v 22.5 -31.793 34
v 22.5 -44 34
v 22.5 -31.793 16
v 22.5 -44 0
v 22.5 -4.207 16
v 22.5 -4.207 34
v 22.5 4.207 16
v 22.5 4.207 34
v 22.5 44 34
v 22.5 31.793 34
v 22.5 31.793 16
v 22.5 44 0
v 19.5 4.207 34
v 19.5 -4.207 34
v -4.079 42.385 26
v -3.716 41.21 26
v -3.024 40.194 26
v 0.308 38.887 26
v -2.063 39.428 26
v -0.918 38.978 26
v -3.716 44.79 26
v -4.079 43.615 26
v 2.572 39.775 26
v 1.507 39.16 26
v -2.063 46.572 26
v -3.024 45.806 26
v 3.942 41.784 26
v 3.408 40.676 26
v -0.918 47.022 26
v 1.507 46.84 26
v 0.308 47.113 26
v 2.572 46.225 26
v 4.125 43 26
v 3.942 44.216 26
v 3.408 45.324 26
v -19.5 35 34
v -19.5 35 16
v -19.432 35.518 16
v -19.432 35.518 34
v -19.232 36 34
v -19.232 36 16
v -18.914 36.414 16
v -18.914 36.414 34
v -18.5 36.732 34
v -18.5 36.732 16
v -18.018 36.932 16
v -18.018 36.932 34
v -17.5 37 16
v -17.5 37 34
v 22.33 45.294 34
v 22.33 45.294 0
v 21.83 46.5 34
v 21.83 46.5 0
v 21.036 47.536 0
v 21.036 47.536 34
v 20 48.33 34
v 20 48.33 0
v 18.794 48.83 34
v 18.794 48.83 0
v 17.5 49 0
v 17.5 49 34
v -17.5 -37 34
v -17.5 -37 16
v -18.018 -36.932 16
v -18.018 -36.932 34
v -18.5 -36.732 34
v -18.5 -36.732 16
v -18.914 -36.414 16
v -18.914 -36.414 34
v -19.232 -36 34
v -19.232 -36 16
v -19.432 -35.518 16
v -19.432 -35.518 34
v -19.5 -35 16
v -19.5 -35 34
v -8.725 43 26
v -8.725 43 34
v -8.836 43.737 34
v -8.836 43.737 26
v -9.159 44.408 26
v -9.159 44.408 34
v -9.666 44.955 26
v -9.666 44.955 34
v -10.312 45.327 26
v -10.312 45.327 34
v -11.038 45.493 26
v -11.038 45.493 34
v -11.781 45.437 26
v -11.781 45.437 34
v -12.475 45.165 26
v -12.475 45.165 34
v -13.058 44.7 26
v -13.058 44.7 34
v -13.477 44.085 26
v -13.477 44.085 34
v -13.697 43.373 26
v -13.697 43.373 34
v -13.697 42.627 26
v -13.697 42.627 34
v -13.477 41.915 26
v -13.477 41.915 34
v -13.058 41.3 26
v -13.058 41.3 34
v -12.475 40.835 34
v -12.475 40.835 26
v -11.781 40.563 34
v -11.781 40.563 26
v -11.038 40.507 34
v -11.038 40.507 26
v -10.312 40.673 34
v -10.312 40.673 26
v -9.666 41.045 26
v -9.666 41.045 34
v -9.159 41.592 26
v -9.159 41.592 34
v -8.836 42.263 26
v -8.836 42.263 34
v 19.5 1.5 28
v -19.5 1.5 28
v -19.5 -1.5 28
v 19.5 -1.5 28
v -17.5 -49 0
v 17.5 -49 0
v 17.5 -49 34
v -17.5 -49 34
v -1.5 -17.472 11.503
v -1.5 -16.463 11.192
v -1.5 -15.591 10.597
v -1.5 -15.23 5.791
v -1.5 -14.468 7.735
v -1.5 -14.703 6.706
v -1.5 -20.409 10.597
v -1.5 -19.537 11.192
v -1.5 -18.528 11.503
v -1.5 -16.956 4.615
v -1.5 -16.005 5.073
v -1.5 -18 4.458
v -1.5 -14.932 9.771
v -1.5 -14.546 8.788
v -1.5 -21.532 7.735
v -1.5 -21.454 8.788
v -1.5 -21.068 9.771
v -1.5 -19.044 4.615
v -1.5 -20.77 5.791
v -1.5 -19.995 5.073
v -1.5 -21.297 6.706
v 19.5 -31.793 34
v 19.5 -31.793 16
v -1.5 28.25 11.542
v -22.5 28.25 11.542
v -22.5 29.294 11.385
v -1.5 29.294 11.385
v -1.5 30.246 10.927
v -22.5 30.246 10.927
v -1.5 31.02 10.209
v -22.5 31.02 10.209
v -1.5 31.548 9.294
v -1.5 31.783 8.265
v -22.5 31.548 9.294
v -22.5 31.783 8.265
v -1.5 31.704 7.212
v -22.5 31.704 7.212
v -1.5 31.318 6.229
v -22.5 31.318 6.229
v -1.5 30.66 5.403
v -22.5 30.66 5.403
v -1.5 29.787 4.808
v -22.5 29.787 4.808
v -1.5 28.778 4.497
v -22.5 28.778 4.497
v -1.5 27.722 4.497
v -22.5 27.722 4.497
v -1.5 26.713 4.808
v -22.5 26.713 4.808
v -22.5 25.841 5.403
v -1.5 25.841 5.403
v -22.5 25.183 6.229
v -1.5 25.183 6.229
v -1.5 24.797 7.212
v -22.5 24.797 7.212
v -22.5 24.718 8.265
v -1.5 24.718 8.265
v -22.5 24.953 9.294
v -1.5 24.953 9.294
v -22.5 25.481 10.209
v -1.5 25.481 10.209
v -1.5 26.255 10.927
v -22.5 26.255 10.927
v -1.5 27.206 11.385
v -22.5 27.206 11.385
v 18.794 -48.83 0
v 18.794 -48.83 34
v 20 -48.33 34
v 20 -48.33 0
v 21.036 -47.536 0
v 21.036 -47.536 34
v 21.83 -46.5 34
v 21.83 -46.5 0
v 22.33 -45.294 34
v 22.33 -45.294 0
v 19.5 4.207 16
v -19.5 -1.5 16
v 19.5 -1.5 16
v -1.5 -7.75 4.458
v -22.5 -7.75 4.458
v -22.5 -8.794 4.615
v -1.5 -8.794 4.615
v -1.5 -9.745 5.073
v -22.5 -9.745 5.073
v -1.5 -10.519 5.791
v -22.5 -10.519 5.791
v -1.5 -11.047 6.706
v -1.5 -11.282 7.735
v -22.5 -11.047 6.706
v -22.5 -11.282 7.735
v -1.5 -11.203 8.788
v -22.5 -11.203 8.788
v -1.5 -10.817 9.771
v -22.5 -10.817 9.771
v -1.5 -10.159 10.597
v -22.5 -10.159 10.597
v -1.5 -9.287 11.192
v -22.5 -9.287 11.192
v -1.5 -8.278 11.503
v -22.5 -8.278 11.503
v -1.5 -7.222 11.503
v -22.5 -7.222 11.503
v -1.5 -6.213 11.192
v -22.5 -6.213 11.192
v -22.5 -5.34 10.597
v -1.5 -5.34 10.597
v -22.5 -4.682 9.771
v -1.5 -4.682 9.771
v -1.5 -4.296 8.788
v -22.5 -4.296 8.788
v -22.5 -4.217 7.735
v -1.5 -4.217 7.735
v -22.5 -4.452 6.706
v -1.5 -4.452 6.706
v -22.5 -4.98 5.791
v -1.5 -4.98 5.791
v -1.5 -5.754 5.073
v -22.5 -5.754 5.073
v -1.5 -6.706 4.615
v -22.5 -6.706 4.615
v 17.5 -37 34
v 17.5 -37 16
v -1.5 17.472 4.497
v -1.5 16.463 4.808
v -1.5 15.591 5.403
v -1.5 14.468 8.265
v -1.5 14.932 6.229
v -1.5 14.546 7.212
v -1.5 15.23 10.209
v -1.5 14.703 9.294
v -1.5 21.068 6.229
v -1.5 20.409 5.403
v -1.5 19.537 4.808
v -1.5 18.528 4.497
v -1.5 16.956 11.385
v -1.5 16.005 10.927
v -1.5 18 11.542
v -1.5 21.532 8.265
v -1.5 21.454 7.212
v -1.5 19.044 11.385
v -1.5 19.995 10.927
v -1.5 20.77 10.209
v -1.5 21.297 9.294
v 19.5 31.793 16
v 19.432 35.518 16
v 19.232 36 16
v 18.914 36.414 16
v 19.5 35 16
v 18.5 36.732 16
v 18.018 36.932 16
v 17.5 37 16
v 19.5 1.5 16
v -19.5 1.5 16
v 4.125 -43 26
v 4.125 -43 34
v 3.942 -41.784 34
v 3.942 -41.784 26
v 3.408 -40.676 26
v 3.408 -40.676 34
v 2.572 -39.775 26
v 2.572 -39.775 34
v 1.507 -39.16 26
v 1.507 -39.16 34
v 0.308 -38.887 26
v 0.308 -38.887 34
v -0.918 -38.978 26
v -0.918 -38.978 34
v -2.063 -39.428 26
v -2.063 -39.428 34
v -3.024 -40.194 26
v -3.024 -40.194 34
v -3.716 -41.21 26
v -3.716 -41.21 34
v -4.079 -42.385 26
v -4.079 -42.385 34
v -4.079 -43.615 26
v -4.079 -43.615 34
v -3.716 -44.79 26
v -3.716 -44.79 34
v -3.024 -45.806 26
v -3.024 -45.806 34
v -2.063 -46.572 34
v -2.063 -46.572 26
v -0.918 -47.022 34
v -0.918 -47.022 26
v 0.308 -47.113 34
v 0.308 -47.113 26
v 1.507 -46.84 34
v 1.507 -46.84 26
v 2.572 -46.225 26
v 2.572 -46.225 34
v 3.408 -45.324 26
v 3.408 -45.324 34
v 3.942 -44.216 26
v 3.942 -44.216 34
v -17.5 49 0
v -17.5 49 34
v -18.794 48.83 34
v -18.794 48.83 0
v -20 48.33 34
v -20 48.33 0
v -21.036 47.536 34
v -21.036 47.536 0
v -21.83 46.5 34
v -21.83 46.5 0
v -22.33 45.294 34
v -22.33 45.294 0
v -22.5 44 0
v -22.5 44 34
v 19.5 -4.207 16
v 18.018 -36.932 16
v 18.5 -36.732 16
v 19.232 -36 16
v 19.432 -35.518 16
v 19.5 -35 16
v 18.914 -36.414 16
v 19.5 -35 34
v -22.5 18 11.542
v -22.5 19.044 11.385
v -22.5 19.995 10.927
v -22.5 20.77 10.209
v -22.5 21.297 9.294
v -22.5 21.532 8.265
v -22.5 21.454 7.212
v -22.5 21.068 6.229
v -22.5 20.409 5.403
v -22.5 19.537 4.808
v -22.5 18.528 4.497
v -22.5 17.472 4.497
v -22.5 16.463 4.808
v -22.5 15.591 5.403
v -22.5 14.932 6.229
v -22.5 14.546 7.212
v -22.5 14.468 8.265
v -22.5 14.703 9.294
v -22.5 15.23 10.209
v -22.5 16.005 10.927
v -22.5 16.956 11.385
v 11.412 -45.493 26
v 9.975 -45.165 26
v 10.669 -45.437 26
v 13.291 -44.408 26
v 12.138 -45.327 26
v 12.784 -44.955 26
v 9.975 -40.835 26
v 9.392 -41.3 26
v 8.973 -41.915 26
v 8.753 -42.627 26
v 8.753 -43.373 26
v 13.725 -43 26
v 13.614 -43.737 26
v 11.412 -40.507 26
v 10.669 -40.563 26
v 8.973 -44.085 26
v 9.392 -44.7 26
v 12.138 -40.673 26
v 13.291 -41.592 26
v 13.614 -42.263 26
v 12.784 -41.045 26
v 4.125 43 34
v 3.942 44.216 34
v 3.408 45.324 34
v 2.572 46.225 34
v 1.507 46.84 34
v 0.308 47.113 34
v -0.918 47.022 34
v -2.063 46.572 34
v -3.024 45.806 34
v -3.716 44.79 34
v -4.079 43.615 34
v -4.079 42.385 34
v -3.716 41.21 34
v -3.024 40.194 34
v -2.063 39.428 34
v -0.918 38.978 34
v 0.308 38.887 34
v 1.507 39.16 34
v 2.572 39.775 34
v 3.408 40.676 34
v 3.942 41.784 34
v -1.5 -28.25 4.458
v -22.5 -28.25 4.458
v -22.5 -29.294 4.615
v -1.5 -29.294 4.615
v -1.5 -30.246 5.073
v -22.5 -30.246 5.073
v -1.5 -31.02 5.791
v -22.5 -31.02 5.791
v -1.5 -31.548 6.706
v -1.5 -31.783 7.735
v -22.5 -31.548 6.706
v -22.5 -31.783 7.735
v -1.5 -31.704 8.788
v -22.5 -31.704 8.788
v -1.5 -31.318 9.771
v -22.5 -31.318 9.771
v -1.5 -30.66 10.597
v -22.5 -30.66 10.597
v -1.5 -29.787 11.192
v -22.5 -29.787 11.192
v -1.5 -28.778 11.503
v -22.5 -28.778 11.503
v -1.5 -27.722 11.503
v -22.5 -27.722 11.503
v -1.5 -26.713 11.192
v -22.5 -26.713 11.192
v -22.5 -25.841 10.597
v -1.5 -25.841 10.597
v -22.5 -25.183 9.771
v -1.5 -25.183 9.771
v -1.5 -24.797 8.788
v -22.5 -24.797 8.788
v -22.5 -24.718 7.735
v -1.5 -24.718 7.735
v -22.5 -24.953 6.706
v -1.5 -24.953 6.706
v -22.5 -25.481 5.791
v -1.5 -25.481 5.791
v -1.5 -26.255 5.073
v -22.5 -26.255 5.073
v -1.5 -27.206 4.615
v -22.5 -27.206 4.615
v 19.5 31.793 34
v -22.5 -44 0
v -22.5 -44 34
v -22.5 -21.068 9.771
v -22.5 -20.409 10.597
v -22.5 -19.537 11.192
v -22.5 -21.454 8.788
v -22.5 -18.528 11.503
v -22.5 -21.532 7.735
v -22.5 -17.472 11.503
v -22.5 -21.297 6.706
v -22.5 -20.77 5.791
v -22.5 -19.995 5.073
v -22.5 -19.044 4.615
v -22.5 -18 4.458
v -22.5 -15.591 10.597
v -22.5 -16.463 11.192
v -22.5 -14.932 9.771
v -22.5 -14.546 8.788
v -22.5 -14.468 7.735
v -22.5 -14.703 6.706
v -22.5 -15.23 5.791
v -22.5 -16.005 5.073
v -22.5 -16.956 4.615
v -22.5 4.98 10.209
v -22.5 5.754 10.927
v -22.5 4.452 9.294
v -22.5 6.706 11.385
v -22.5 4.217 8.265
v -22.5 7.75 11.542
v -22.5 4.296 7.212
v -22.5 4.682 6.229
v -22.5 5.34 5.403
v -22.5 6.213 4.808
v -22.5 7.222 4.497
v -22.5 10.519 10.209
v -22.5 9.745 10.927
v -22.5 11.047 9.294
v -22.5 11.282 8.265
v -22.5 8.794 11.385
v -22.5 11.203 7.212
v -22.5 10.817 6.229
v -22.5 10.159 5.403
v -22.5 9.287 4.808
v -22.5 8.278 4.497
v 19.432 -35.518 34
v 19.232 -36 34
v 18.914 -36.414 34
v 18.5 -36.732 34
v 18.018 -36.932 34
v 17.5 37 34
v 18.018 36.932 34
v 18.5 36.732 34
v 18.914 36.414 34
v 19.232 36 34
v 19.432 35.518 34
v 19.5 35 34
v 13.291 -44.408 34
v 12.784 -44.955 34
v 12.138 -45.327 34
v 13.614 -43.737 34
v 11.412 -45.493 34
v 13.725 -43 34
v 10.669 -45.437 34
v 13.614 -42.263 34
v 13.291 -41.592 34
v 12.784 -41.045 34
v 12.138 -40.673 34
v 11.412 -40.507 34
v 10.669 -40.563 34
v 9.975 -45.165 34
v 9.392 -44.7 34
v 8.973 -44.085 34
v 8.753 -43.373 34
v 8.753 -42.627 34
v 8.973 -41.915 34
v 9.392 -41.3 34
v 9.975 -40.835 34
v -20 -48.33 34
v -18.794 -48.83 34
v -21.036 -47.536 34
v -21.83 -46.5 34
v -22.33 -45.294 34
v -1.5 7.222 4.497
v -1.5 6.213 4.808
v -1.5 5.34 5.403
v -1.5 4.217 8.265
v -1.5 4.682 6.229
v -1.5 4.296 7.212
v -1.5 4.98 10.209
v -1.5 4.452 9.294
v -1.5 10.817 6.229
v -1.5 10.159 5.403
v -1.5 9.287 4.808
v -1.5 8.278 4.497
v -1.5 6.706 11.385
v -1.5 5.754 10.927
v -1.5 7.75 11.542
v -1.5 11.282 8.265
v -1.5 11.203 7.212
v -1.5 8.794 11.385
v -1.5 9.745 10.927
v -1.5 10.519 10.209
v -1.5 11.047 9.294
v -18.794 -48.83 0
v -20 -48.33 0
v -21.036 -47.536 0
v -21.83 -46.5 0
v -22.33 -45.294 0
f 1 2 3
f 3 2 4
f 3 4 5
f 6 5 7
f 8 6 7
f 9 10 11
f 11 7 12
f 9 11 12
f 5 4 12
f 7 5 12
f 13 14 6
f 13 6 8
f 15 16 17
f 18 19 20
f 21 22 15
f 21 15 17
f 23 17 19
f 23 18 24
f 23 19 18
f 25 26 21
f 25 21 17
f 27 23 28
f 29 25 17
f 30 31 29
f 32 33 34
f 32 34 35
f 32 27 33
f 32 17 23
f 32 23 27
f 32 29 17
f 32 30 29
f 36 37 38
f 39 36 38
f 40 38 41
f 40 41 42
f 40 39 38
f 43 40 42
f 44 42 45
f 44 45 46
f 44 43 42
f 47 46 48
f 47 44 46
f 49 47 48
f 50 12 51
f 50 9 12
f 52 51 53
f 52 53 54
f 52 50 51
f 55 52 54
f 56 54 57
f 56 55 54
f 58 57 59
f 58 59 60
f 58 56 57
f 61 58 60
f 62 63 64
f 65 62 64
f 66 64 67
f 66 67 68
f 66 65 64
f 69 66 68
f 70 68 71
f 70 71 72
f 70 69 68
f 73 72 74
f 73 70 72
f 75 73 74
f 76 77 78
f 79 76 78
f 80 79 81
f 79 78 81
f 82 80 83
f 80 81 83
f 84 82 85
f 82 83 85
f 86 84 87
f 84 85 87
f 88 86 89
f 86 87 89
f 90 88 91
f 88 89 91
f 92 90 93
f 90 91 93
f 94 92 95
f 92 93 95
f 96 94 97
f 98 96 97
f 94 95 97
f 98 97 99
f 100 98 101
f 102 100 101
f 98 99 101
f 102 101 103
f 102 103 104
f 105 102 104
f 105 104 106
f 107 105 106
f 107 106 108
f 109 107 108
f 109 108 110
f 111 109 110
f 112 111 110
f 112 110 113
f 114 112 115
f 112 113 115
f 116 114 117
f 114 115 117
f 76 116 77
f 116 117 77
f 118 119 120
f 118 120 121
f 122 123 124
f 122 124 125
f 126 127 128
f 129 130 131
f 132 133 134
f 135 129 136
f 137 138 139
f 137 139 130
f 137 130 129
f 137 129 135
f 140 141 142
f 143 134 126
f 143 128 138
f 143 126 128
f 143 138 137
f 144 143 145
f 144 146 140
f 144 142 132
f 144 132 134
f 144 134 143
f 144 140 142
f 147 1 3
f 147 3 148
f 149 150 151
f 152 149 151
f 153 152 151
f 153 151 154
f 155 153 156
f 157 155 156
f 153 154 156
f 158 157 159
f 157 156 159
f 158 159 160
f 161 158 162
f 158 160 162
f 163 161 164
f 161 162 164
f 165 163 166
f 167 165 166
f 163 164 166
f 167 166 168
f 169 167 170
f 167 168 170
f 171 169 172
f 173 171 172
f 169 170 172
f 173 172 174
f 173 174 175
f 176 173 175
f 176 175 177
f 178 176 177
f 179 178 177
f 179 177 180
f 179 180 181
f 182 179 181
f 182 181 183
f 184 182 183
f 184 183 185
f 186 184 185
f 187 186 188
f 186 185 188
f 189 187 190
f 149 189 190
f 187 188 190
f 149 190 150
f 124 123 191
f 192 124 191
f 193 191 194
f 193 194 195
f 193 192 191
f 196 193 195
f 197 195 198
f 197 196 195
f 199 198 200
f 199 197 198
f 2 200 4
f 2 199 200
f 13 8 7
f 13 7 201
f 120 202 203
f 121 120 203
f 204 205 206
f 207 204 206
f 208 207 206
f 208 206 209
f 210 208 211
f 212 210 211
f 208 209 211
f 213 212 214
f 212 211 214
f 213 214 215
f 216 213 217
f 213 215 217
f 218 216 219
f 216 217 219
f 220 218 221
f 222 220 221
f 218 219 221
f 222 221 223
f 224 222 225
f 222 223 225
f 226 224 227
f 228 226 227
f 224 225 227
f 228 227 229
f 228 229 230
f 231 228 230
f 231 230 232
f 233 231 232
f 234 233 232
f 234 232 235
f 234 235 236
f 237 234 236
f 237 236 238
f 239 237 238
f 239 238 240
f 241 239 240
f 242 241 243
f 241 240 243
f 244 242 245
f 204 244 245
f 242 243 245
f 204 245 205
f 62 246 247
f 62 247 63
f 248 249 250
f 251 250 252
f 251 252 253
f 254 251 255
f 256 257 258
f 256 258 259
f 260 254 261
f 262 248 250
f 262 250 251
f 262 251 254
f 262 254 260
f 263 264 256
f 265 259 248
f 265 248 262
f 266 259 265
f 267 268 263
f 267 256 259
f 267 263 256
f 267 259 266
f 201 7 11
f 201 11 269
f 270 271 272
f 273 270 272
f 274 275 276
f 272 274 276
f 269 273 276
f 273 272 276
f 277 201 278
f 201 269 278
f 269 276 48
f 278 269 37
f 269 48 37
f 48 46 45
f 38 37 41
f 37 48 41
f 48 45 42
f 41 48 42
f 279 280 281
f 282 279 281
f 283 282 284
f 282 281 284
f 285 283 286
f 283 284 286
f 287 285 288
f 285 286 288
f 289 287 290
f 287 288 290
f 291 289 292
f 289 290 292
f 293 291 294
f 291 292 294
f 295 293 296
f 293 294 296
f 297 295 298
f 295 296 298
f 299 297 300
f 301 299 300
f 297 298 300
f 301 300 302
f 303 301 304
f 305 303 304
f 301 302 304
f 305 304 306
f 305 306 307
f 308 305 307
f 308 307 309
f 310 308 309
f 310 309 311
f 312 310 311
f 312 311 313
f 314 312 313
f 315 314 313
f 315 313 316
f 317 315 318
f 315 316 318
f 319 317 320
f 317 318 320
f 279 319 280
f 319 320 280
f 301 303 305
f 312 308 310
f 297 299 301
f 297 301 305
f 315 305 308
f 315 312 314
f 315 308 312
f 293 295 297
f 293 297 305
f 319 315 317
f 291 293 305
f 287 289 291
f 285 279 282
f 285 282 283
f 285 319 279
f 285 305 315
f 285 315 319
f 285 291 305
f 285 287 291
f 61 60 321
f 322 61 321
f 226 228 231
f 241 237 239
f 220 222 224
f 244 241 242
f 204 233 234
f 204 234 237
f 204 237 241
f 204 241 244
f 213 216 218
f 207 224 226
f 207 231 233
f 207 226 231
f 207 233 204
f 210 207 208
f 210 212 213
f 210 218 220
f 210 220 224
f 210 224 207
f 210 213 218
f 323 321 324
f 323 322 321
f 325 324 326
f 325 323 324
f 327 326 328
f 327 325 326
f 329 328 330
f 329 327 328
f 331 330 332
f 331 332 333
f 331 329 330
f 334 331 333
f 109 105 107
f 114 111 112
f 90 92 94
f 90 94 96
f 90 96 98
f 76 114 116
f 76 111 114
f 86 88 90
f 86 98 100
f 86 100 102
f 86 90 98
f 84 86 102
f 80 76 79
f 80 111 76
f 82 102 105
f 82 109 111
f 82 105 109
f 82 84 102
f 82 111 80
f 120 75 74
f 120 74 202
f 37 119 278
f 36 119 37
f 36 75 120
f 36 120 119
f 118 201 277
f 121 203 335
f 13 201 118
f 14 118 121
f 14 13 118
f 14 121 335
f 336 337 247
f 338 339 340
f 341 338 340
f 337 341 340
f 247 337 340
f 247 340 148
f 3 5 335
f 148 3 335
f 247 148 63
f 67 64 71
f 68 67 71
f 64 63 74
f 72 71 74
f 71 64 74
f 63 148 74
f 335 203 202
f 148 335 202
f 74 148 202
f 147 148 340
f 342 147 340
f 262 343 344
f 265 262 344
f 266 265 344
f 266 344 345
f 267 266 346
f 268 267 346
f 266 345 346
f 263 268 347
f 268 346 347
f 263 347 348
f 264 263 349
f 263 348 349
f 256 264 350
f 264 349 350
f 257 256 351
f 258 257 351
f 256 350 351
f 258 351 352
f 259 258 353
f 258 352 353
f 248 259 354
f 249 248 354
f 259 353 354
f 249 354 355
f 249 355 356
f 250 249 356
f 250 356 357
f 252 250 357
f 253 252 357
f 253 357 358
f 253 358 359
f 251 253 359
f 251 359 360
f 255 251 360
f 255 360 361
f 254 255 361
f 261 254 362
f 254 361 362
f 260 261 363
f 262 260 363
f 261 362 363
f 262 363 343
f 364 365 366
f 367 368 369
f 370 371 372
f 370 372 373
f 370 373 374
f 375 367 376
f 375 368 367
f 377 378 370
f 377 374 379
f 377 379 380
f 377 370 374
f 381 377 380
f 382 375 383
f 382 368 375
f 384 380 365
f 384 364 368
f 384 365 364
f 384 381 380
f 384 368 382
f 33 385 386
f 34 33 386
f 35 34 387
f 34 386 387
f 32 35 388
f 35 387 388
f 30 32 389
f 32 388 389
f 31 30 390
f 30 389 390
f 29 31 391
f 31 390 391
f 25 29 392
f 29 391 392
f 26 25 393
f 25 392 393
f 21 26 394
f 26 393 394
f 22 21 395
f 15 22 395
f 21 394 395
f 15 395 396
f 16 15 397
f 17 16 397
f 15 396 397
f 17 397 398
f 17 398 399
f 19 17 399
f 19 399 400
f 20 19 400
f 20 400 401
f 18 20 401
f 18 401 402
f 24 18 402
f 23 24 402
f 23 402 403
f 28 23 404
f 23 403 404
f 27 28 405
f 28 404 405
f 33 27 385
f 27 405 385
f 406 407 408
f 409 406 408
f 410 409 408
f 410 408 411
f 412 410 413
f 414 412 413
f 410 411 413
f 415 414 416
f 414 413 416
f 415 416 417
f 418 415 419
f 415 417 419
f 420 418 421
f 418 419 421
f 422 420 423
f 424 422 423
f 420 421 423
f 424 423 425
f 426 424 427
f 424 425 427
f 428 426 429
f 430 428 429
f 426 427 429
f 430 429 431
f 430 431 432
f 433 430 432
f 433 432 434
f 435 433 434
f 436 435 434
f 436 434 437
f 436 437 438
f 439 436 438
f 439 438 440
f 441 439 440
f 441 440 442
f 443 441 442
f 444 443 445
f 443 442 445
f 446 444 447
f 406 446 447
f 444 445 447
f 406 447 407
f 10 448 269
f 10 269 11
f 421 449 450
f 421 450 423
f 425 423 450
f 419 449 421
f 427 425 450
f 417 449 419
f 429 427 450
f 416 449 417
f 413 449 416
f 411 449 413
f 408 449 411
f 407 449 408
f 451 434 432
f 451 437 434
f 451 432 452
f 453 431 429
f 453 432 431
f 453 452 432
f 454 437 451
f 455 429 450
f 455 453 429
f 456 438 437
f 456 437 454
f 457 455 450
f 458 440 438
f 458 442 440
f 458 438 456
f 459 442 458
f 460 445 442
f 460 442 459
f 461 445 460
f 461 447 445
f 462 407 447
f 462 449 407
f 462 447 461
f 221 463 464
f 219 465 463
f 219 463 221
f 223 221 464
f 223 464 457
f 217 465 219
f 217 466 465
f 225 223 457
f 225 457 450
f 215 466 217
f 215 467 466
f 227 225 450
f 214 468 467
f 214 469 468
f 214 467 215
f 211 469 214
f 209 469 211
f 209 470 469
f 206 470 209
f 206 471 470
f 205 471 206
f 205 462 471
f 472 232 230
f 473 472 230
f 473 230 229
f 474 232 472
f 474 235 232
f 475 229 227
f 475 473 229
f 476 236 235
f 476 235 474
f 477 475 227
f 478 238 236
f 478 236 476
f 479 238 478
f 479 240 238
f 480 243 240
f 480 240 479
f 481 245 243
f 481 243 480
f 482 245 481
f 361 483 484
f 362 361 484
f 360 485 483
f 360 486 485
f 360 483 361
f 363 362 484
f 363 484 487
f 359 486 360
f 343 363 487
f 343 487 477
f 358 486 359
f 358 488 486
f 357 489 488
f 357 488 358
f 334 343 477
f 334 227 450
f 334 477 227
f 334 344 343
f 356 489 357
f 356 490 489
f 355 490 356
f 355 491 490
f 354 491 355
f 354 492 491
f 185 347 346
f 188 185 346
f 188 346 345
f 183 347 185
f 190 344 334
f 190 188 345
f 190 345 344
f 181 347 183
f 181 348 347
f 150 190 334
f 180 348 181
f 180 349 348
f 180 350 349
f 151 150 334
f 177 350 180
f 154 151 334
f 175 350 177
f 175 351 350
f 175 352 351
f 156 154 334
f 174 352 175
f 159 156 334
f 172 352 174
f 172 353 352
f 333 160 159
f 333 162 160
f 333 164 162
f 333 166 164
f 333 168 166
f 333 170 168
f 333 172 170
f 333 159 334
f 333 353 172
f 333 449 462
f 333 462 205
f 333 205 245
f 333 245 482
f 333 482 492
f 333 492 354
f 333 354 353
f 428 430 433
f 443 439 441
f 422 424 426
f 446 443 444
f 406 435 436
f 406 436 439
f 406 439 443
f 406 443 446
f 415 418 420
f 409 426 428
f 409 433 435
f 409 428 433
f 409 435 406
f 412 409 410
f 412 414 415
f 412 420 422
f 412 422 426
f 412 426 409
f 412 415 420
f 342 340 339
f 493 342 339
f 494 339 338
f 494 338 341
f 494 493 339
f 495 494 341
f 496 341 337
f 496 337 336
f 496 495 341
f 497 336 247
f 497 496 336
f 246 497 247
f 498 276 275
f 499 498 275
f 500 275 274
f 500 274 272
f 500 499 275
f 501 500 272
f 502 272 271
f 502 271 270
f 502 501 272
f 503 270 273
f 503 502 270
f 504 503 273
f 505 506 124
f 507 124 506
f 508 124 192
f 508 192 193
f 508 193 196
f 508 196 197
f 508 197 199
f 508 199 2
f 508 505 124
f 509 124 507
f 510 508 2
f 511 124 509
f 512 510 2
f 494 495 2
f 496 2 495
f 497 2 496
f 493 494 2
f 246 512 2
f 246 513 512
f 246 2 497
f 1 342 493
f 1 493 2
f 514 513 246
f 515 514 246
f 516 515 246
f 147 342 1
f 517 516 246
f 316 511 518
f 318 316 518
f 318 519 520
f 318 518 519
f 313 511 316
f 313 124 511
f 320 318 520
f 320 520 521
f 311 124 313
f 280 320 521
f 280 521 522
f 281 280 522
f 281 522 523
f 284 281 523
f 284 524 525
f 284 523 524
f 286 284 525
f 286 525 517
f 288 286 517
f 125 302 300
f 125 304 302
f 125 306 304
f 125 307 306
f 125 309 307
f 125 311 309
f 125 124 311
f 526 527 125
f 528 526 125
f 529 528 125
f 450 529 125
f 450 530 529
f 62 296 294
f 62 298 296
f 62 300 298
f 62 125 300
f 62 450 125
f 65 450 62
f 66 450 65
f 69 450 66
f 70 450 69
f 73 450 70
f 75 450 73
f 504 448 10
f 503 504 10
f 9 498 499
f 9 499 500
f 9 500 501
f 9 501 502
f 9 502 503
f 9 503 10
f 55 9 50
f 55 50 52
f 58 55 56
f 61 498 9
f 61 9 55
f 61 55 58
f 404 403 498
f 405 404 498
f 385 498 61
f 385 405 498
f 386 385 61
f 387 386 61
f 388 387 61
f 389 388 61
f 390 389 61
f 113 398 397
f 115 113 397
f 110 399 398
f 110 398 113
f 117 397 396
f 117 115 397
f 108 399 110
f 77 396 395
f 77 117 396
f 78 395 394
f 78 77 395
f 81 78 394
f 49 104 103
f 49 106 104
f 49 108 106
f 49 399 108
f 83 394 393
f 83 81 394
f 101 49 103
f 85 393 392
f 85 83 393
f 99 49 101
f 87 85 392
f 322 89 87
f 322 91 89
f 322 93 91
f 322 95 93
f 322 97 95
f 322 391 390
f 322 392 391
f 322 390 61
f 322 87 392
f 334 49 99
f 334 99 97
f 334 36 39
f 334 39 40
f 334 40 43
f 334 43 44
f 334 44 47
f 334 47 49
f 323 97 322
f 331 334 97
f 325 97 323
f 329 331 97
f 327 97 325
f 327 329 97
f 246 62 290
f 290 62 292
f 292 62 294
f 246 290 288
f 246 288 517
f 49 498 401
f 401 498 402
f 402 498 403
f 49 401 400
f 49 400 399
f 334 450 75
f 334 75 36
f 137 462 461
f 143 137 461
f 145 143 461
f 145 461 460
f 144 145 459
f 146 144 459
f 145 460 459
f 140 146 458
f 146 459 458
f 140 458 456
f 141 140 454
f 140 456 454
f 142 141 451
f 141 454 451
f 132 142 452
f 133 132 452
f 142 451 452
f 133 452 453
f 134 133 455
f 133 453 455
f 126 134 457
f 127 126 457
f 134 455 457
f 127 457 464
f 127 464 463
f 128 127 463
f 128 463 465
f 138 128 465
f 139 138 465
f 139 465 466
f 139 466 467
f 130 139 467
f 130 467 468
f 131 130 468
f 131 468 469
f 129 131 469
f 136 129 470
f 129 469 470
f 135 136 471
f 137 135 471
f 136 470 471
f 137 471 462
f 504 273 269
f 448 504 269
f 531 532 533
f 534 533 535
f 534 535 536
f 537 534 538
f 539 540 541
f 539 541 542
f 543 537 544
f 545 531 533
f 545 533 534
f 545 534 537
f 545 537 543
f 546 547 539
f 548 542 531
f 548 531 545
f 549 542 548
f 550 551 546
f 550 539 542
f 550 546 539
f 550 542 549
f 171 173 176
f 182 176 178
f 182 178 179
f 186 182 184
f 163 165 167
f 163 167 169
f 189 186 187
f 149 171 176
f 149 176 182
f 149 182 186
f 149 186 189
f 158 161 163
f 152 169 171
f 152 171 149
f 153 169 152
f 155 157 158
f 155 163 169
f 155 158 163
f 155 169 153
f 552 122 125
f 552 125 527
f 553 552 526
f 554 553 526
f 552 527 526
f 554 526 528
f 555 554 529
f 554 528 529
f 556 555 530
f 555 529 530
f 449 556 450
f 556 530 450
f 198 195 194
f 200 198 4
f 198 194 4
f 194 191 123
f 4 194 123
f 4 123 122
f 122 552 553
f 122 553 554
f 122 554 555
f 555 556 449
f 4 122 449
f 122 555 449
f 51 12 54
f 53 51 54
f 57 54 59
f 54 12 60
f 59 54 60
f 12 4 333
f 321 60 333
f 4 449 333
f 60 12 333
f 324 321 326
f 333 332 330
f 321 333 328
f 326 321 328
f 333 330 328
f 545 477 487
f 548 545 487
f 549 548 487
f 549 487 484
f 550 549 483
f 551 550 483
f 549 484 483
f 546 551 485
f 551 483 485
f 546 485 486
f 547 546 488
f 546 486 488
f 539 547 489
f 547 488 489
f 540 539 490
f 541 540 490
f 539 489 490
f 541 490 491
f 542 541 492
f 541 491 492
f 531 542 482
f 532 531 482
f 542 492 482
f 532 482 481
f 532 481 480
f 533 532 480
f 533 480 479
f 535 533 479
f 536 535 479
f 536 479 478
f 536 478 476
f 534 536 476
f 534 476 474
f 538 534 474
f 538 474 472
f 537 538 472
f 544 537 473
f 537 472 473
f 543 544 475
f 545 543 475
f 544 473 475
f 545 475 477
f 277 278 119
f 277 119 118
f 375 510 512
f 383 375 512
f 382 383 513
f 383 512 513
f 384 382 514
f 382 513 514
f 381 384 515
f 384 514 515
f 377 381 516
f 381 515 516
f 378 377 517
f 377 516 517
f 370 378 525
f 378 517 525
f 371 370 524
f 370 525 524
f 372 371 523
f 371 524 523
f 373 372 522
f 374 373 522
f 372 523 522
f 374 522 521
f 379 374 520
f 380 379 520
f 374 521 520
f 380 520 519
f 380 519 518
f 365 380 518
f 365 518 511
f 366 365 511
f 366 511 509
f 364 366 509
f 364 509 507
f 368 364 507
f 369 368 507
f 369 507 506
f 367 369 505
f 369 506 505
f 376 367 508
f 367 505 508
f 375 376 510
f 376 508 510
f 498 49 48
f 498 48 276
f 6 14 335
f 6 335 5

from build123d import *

# Parameters (mm, degrees)
CROQUIS1_W              = 98
CROQUIS1_H              = 45
SALIENTE_EXTRUIR1_DEPTH = 34
REDONDEO1_R             = 5
CROQUIS2_R              = 4.125
CROQUIS2_R_2            = 2.5
CORTAR_EXTRUIR1_DEPTH   = 8
CORTAR_EXTRUIR2_DEPTH   = 18
CROQUIS4_W              = 39
CROQUIS4_H              = 3
SALIENTE_EXTRUIR2_DEPTH = 12
CROQUIS5_R              = 3.54232781
CORTAR_EXTRUIR3_DEPTH   = 21


with BuildPart() as part:
    # Croquis1 → Saliente-Extruir1 (new body)
    with BuildSketch(Plane(origin=(0, 0, 0), x_dir=(0, 1, 0), z_dir=(0, 0, 1))):
        Rectangle(CROQUIS1_W, CROQUIS1_H)
    extrude(amount=SALIENTE_EXTRUIR1_DEPTH)

    # Redondeo1
    redondeo1_edges = [part.edges().sort_by_distance(p)[0] for p in [
        (22.5, 49, 17),
        (22.5, -49, 17),
        (-22.5, -49, 17),
        (-22.5, 49, 17),
    ]]
    fillet(redondeo1_edges, radius=REDONDEO1_R)

    # Croquis2 → Cortar-Extruir1 (cut)
    with BuildSketch(Plane.XY.offset(34)):
        with Locations((0, 43)):
            Circle(CROQUIS2_R)
        with Locations((0, -43)):
            Circle(CROQUIS2_R)
        with Locations((-11.225, 43)):
            Circle(CROQUIS2_R_2)
        with Locations((11.225, -43)):
            Circle(CROQUIS2_R_2)
    extrude(amount=-CORTAR_EXTRUIR1_DEPTH, mode=Mode.SUBTRACT)

    # Croquis3 → Cortar-Extruir2 (cut)
    with BuildSketch(Plane.XY.offset(34)):
        with BuildLine():
            Line((-19.5, -35), (-19.5, 35))
            ThreePointArc((-19.5, 35), (-18.914213562, 36.414213562), (-17.5, 37))
            Line((-17.5, 37), (17.5, 37))
            ThreePointArc((17.5, 37), (18.914213562, 36.414213562), (19.5, 35))
            Line((19.5, 35), (19.5, 31.792704716))
            Line((19.5, 31.792704716), (22.5, 31.792704716))
            Line((22.5, 31.792704716), (22.5, 4.207295284))
            Line((22.5, 4.207295284), (19.5, 4.207295284))
            Line((19.5, 4.207295284), (19.5, -4.207295284))
            Line((19.5, -4.207295284), (22.5, -4.207295284))
            Line((22.5, -4.207295284), (22.5, -31.792704716))
            Line((22.5, -31.792704716), (19.5, -31.792704716))
            Line((19.5, -31.792704716), (19.5, -35))
            ThreePointArc((19.5, -35), (18.914213562, -36.414213562), (17.5, -37))
            Line((17.5, -37), (-17.5, -37))
            ThreePointArc((-17.5, -37), (-18.914213562, -36.414213562), (-19.5, -35))
        make_face()
    extrude(amount=-CORTAR_EXTRUIR2_DEPTH, mode=Mode.SUBTRACT)

    # Croquis4 → Saliente-Extruir2 (add)
    with BuildSketch(Plane.XY.offset(16)):
        Rectangle(CROQUIS4_W, CROQUIS4_H)
    extrude(amount=SALIENTE_EXTRUIR2_DEPTH)

    # Croquis5 → Cortar-Extruir3 (cut)
    with BuildSketch(Plane(origin=(-22.5, 0, 0), x_dir=(0, -1, 0), z_dir=(-1, 0, 0))):
        with Locations(Location((-7.749623094, 8, 0), (0, 0, 90))):
            Circle(CROQUIS5_R)
        with Locations(Location((-18, 8, 0), (0, 0, 90))):
            Circle(CROQUIS5_R)
        with Locations(Location((-28.250376906, 8, 0), (0, 0, 90))):
            Circle(CROQUIS5_R)
        with Locations(Location((28.250376906, 8, 0), (0, 0, 270))):
            Circle(CROQUIS5_R)
        with Locations(Location((18, 8, 0), (0, 0, 270))):
            Circle(CROQUIS5_R)
        with Locations(Location((7.749623094, 8, 0), (0, 0, 270))):
            Circle(CROQUIS5_R)
    extrude(amount=-CORTAR_EXTRUIR3_DEPTH, mode=Mode.SUBTRACT)


solid = part.part
